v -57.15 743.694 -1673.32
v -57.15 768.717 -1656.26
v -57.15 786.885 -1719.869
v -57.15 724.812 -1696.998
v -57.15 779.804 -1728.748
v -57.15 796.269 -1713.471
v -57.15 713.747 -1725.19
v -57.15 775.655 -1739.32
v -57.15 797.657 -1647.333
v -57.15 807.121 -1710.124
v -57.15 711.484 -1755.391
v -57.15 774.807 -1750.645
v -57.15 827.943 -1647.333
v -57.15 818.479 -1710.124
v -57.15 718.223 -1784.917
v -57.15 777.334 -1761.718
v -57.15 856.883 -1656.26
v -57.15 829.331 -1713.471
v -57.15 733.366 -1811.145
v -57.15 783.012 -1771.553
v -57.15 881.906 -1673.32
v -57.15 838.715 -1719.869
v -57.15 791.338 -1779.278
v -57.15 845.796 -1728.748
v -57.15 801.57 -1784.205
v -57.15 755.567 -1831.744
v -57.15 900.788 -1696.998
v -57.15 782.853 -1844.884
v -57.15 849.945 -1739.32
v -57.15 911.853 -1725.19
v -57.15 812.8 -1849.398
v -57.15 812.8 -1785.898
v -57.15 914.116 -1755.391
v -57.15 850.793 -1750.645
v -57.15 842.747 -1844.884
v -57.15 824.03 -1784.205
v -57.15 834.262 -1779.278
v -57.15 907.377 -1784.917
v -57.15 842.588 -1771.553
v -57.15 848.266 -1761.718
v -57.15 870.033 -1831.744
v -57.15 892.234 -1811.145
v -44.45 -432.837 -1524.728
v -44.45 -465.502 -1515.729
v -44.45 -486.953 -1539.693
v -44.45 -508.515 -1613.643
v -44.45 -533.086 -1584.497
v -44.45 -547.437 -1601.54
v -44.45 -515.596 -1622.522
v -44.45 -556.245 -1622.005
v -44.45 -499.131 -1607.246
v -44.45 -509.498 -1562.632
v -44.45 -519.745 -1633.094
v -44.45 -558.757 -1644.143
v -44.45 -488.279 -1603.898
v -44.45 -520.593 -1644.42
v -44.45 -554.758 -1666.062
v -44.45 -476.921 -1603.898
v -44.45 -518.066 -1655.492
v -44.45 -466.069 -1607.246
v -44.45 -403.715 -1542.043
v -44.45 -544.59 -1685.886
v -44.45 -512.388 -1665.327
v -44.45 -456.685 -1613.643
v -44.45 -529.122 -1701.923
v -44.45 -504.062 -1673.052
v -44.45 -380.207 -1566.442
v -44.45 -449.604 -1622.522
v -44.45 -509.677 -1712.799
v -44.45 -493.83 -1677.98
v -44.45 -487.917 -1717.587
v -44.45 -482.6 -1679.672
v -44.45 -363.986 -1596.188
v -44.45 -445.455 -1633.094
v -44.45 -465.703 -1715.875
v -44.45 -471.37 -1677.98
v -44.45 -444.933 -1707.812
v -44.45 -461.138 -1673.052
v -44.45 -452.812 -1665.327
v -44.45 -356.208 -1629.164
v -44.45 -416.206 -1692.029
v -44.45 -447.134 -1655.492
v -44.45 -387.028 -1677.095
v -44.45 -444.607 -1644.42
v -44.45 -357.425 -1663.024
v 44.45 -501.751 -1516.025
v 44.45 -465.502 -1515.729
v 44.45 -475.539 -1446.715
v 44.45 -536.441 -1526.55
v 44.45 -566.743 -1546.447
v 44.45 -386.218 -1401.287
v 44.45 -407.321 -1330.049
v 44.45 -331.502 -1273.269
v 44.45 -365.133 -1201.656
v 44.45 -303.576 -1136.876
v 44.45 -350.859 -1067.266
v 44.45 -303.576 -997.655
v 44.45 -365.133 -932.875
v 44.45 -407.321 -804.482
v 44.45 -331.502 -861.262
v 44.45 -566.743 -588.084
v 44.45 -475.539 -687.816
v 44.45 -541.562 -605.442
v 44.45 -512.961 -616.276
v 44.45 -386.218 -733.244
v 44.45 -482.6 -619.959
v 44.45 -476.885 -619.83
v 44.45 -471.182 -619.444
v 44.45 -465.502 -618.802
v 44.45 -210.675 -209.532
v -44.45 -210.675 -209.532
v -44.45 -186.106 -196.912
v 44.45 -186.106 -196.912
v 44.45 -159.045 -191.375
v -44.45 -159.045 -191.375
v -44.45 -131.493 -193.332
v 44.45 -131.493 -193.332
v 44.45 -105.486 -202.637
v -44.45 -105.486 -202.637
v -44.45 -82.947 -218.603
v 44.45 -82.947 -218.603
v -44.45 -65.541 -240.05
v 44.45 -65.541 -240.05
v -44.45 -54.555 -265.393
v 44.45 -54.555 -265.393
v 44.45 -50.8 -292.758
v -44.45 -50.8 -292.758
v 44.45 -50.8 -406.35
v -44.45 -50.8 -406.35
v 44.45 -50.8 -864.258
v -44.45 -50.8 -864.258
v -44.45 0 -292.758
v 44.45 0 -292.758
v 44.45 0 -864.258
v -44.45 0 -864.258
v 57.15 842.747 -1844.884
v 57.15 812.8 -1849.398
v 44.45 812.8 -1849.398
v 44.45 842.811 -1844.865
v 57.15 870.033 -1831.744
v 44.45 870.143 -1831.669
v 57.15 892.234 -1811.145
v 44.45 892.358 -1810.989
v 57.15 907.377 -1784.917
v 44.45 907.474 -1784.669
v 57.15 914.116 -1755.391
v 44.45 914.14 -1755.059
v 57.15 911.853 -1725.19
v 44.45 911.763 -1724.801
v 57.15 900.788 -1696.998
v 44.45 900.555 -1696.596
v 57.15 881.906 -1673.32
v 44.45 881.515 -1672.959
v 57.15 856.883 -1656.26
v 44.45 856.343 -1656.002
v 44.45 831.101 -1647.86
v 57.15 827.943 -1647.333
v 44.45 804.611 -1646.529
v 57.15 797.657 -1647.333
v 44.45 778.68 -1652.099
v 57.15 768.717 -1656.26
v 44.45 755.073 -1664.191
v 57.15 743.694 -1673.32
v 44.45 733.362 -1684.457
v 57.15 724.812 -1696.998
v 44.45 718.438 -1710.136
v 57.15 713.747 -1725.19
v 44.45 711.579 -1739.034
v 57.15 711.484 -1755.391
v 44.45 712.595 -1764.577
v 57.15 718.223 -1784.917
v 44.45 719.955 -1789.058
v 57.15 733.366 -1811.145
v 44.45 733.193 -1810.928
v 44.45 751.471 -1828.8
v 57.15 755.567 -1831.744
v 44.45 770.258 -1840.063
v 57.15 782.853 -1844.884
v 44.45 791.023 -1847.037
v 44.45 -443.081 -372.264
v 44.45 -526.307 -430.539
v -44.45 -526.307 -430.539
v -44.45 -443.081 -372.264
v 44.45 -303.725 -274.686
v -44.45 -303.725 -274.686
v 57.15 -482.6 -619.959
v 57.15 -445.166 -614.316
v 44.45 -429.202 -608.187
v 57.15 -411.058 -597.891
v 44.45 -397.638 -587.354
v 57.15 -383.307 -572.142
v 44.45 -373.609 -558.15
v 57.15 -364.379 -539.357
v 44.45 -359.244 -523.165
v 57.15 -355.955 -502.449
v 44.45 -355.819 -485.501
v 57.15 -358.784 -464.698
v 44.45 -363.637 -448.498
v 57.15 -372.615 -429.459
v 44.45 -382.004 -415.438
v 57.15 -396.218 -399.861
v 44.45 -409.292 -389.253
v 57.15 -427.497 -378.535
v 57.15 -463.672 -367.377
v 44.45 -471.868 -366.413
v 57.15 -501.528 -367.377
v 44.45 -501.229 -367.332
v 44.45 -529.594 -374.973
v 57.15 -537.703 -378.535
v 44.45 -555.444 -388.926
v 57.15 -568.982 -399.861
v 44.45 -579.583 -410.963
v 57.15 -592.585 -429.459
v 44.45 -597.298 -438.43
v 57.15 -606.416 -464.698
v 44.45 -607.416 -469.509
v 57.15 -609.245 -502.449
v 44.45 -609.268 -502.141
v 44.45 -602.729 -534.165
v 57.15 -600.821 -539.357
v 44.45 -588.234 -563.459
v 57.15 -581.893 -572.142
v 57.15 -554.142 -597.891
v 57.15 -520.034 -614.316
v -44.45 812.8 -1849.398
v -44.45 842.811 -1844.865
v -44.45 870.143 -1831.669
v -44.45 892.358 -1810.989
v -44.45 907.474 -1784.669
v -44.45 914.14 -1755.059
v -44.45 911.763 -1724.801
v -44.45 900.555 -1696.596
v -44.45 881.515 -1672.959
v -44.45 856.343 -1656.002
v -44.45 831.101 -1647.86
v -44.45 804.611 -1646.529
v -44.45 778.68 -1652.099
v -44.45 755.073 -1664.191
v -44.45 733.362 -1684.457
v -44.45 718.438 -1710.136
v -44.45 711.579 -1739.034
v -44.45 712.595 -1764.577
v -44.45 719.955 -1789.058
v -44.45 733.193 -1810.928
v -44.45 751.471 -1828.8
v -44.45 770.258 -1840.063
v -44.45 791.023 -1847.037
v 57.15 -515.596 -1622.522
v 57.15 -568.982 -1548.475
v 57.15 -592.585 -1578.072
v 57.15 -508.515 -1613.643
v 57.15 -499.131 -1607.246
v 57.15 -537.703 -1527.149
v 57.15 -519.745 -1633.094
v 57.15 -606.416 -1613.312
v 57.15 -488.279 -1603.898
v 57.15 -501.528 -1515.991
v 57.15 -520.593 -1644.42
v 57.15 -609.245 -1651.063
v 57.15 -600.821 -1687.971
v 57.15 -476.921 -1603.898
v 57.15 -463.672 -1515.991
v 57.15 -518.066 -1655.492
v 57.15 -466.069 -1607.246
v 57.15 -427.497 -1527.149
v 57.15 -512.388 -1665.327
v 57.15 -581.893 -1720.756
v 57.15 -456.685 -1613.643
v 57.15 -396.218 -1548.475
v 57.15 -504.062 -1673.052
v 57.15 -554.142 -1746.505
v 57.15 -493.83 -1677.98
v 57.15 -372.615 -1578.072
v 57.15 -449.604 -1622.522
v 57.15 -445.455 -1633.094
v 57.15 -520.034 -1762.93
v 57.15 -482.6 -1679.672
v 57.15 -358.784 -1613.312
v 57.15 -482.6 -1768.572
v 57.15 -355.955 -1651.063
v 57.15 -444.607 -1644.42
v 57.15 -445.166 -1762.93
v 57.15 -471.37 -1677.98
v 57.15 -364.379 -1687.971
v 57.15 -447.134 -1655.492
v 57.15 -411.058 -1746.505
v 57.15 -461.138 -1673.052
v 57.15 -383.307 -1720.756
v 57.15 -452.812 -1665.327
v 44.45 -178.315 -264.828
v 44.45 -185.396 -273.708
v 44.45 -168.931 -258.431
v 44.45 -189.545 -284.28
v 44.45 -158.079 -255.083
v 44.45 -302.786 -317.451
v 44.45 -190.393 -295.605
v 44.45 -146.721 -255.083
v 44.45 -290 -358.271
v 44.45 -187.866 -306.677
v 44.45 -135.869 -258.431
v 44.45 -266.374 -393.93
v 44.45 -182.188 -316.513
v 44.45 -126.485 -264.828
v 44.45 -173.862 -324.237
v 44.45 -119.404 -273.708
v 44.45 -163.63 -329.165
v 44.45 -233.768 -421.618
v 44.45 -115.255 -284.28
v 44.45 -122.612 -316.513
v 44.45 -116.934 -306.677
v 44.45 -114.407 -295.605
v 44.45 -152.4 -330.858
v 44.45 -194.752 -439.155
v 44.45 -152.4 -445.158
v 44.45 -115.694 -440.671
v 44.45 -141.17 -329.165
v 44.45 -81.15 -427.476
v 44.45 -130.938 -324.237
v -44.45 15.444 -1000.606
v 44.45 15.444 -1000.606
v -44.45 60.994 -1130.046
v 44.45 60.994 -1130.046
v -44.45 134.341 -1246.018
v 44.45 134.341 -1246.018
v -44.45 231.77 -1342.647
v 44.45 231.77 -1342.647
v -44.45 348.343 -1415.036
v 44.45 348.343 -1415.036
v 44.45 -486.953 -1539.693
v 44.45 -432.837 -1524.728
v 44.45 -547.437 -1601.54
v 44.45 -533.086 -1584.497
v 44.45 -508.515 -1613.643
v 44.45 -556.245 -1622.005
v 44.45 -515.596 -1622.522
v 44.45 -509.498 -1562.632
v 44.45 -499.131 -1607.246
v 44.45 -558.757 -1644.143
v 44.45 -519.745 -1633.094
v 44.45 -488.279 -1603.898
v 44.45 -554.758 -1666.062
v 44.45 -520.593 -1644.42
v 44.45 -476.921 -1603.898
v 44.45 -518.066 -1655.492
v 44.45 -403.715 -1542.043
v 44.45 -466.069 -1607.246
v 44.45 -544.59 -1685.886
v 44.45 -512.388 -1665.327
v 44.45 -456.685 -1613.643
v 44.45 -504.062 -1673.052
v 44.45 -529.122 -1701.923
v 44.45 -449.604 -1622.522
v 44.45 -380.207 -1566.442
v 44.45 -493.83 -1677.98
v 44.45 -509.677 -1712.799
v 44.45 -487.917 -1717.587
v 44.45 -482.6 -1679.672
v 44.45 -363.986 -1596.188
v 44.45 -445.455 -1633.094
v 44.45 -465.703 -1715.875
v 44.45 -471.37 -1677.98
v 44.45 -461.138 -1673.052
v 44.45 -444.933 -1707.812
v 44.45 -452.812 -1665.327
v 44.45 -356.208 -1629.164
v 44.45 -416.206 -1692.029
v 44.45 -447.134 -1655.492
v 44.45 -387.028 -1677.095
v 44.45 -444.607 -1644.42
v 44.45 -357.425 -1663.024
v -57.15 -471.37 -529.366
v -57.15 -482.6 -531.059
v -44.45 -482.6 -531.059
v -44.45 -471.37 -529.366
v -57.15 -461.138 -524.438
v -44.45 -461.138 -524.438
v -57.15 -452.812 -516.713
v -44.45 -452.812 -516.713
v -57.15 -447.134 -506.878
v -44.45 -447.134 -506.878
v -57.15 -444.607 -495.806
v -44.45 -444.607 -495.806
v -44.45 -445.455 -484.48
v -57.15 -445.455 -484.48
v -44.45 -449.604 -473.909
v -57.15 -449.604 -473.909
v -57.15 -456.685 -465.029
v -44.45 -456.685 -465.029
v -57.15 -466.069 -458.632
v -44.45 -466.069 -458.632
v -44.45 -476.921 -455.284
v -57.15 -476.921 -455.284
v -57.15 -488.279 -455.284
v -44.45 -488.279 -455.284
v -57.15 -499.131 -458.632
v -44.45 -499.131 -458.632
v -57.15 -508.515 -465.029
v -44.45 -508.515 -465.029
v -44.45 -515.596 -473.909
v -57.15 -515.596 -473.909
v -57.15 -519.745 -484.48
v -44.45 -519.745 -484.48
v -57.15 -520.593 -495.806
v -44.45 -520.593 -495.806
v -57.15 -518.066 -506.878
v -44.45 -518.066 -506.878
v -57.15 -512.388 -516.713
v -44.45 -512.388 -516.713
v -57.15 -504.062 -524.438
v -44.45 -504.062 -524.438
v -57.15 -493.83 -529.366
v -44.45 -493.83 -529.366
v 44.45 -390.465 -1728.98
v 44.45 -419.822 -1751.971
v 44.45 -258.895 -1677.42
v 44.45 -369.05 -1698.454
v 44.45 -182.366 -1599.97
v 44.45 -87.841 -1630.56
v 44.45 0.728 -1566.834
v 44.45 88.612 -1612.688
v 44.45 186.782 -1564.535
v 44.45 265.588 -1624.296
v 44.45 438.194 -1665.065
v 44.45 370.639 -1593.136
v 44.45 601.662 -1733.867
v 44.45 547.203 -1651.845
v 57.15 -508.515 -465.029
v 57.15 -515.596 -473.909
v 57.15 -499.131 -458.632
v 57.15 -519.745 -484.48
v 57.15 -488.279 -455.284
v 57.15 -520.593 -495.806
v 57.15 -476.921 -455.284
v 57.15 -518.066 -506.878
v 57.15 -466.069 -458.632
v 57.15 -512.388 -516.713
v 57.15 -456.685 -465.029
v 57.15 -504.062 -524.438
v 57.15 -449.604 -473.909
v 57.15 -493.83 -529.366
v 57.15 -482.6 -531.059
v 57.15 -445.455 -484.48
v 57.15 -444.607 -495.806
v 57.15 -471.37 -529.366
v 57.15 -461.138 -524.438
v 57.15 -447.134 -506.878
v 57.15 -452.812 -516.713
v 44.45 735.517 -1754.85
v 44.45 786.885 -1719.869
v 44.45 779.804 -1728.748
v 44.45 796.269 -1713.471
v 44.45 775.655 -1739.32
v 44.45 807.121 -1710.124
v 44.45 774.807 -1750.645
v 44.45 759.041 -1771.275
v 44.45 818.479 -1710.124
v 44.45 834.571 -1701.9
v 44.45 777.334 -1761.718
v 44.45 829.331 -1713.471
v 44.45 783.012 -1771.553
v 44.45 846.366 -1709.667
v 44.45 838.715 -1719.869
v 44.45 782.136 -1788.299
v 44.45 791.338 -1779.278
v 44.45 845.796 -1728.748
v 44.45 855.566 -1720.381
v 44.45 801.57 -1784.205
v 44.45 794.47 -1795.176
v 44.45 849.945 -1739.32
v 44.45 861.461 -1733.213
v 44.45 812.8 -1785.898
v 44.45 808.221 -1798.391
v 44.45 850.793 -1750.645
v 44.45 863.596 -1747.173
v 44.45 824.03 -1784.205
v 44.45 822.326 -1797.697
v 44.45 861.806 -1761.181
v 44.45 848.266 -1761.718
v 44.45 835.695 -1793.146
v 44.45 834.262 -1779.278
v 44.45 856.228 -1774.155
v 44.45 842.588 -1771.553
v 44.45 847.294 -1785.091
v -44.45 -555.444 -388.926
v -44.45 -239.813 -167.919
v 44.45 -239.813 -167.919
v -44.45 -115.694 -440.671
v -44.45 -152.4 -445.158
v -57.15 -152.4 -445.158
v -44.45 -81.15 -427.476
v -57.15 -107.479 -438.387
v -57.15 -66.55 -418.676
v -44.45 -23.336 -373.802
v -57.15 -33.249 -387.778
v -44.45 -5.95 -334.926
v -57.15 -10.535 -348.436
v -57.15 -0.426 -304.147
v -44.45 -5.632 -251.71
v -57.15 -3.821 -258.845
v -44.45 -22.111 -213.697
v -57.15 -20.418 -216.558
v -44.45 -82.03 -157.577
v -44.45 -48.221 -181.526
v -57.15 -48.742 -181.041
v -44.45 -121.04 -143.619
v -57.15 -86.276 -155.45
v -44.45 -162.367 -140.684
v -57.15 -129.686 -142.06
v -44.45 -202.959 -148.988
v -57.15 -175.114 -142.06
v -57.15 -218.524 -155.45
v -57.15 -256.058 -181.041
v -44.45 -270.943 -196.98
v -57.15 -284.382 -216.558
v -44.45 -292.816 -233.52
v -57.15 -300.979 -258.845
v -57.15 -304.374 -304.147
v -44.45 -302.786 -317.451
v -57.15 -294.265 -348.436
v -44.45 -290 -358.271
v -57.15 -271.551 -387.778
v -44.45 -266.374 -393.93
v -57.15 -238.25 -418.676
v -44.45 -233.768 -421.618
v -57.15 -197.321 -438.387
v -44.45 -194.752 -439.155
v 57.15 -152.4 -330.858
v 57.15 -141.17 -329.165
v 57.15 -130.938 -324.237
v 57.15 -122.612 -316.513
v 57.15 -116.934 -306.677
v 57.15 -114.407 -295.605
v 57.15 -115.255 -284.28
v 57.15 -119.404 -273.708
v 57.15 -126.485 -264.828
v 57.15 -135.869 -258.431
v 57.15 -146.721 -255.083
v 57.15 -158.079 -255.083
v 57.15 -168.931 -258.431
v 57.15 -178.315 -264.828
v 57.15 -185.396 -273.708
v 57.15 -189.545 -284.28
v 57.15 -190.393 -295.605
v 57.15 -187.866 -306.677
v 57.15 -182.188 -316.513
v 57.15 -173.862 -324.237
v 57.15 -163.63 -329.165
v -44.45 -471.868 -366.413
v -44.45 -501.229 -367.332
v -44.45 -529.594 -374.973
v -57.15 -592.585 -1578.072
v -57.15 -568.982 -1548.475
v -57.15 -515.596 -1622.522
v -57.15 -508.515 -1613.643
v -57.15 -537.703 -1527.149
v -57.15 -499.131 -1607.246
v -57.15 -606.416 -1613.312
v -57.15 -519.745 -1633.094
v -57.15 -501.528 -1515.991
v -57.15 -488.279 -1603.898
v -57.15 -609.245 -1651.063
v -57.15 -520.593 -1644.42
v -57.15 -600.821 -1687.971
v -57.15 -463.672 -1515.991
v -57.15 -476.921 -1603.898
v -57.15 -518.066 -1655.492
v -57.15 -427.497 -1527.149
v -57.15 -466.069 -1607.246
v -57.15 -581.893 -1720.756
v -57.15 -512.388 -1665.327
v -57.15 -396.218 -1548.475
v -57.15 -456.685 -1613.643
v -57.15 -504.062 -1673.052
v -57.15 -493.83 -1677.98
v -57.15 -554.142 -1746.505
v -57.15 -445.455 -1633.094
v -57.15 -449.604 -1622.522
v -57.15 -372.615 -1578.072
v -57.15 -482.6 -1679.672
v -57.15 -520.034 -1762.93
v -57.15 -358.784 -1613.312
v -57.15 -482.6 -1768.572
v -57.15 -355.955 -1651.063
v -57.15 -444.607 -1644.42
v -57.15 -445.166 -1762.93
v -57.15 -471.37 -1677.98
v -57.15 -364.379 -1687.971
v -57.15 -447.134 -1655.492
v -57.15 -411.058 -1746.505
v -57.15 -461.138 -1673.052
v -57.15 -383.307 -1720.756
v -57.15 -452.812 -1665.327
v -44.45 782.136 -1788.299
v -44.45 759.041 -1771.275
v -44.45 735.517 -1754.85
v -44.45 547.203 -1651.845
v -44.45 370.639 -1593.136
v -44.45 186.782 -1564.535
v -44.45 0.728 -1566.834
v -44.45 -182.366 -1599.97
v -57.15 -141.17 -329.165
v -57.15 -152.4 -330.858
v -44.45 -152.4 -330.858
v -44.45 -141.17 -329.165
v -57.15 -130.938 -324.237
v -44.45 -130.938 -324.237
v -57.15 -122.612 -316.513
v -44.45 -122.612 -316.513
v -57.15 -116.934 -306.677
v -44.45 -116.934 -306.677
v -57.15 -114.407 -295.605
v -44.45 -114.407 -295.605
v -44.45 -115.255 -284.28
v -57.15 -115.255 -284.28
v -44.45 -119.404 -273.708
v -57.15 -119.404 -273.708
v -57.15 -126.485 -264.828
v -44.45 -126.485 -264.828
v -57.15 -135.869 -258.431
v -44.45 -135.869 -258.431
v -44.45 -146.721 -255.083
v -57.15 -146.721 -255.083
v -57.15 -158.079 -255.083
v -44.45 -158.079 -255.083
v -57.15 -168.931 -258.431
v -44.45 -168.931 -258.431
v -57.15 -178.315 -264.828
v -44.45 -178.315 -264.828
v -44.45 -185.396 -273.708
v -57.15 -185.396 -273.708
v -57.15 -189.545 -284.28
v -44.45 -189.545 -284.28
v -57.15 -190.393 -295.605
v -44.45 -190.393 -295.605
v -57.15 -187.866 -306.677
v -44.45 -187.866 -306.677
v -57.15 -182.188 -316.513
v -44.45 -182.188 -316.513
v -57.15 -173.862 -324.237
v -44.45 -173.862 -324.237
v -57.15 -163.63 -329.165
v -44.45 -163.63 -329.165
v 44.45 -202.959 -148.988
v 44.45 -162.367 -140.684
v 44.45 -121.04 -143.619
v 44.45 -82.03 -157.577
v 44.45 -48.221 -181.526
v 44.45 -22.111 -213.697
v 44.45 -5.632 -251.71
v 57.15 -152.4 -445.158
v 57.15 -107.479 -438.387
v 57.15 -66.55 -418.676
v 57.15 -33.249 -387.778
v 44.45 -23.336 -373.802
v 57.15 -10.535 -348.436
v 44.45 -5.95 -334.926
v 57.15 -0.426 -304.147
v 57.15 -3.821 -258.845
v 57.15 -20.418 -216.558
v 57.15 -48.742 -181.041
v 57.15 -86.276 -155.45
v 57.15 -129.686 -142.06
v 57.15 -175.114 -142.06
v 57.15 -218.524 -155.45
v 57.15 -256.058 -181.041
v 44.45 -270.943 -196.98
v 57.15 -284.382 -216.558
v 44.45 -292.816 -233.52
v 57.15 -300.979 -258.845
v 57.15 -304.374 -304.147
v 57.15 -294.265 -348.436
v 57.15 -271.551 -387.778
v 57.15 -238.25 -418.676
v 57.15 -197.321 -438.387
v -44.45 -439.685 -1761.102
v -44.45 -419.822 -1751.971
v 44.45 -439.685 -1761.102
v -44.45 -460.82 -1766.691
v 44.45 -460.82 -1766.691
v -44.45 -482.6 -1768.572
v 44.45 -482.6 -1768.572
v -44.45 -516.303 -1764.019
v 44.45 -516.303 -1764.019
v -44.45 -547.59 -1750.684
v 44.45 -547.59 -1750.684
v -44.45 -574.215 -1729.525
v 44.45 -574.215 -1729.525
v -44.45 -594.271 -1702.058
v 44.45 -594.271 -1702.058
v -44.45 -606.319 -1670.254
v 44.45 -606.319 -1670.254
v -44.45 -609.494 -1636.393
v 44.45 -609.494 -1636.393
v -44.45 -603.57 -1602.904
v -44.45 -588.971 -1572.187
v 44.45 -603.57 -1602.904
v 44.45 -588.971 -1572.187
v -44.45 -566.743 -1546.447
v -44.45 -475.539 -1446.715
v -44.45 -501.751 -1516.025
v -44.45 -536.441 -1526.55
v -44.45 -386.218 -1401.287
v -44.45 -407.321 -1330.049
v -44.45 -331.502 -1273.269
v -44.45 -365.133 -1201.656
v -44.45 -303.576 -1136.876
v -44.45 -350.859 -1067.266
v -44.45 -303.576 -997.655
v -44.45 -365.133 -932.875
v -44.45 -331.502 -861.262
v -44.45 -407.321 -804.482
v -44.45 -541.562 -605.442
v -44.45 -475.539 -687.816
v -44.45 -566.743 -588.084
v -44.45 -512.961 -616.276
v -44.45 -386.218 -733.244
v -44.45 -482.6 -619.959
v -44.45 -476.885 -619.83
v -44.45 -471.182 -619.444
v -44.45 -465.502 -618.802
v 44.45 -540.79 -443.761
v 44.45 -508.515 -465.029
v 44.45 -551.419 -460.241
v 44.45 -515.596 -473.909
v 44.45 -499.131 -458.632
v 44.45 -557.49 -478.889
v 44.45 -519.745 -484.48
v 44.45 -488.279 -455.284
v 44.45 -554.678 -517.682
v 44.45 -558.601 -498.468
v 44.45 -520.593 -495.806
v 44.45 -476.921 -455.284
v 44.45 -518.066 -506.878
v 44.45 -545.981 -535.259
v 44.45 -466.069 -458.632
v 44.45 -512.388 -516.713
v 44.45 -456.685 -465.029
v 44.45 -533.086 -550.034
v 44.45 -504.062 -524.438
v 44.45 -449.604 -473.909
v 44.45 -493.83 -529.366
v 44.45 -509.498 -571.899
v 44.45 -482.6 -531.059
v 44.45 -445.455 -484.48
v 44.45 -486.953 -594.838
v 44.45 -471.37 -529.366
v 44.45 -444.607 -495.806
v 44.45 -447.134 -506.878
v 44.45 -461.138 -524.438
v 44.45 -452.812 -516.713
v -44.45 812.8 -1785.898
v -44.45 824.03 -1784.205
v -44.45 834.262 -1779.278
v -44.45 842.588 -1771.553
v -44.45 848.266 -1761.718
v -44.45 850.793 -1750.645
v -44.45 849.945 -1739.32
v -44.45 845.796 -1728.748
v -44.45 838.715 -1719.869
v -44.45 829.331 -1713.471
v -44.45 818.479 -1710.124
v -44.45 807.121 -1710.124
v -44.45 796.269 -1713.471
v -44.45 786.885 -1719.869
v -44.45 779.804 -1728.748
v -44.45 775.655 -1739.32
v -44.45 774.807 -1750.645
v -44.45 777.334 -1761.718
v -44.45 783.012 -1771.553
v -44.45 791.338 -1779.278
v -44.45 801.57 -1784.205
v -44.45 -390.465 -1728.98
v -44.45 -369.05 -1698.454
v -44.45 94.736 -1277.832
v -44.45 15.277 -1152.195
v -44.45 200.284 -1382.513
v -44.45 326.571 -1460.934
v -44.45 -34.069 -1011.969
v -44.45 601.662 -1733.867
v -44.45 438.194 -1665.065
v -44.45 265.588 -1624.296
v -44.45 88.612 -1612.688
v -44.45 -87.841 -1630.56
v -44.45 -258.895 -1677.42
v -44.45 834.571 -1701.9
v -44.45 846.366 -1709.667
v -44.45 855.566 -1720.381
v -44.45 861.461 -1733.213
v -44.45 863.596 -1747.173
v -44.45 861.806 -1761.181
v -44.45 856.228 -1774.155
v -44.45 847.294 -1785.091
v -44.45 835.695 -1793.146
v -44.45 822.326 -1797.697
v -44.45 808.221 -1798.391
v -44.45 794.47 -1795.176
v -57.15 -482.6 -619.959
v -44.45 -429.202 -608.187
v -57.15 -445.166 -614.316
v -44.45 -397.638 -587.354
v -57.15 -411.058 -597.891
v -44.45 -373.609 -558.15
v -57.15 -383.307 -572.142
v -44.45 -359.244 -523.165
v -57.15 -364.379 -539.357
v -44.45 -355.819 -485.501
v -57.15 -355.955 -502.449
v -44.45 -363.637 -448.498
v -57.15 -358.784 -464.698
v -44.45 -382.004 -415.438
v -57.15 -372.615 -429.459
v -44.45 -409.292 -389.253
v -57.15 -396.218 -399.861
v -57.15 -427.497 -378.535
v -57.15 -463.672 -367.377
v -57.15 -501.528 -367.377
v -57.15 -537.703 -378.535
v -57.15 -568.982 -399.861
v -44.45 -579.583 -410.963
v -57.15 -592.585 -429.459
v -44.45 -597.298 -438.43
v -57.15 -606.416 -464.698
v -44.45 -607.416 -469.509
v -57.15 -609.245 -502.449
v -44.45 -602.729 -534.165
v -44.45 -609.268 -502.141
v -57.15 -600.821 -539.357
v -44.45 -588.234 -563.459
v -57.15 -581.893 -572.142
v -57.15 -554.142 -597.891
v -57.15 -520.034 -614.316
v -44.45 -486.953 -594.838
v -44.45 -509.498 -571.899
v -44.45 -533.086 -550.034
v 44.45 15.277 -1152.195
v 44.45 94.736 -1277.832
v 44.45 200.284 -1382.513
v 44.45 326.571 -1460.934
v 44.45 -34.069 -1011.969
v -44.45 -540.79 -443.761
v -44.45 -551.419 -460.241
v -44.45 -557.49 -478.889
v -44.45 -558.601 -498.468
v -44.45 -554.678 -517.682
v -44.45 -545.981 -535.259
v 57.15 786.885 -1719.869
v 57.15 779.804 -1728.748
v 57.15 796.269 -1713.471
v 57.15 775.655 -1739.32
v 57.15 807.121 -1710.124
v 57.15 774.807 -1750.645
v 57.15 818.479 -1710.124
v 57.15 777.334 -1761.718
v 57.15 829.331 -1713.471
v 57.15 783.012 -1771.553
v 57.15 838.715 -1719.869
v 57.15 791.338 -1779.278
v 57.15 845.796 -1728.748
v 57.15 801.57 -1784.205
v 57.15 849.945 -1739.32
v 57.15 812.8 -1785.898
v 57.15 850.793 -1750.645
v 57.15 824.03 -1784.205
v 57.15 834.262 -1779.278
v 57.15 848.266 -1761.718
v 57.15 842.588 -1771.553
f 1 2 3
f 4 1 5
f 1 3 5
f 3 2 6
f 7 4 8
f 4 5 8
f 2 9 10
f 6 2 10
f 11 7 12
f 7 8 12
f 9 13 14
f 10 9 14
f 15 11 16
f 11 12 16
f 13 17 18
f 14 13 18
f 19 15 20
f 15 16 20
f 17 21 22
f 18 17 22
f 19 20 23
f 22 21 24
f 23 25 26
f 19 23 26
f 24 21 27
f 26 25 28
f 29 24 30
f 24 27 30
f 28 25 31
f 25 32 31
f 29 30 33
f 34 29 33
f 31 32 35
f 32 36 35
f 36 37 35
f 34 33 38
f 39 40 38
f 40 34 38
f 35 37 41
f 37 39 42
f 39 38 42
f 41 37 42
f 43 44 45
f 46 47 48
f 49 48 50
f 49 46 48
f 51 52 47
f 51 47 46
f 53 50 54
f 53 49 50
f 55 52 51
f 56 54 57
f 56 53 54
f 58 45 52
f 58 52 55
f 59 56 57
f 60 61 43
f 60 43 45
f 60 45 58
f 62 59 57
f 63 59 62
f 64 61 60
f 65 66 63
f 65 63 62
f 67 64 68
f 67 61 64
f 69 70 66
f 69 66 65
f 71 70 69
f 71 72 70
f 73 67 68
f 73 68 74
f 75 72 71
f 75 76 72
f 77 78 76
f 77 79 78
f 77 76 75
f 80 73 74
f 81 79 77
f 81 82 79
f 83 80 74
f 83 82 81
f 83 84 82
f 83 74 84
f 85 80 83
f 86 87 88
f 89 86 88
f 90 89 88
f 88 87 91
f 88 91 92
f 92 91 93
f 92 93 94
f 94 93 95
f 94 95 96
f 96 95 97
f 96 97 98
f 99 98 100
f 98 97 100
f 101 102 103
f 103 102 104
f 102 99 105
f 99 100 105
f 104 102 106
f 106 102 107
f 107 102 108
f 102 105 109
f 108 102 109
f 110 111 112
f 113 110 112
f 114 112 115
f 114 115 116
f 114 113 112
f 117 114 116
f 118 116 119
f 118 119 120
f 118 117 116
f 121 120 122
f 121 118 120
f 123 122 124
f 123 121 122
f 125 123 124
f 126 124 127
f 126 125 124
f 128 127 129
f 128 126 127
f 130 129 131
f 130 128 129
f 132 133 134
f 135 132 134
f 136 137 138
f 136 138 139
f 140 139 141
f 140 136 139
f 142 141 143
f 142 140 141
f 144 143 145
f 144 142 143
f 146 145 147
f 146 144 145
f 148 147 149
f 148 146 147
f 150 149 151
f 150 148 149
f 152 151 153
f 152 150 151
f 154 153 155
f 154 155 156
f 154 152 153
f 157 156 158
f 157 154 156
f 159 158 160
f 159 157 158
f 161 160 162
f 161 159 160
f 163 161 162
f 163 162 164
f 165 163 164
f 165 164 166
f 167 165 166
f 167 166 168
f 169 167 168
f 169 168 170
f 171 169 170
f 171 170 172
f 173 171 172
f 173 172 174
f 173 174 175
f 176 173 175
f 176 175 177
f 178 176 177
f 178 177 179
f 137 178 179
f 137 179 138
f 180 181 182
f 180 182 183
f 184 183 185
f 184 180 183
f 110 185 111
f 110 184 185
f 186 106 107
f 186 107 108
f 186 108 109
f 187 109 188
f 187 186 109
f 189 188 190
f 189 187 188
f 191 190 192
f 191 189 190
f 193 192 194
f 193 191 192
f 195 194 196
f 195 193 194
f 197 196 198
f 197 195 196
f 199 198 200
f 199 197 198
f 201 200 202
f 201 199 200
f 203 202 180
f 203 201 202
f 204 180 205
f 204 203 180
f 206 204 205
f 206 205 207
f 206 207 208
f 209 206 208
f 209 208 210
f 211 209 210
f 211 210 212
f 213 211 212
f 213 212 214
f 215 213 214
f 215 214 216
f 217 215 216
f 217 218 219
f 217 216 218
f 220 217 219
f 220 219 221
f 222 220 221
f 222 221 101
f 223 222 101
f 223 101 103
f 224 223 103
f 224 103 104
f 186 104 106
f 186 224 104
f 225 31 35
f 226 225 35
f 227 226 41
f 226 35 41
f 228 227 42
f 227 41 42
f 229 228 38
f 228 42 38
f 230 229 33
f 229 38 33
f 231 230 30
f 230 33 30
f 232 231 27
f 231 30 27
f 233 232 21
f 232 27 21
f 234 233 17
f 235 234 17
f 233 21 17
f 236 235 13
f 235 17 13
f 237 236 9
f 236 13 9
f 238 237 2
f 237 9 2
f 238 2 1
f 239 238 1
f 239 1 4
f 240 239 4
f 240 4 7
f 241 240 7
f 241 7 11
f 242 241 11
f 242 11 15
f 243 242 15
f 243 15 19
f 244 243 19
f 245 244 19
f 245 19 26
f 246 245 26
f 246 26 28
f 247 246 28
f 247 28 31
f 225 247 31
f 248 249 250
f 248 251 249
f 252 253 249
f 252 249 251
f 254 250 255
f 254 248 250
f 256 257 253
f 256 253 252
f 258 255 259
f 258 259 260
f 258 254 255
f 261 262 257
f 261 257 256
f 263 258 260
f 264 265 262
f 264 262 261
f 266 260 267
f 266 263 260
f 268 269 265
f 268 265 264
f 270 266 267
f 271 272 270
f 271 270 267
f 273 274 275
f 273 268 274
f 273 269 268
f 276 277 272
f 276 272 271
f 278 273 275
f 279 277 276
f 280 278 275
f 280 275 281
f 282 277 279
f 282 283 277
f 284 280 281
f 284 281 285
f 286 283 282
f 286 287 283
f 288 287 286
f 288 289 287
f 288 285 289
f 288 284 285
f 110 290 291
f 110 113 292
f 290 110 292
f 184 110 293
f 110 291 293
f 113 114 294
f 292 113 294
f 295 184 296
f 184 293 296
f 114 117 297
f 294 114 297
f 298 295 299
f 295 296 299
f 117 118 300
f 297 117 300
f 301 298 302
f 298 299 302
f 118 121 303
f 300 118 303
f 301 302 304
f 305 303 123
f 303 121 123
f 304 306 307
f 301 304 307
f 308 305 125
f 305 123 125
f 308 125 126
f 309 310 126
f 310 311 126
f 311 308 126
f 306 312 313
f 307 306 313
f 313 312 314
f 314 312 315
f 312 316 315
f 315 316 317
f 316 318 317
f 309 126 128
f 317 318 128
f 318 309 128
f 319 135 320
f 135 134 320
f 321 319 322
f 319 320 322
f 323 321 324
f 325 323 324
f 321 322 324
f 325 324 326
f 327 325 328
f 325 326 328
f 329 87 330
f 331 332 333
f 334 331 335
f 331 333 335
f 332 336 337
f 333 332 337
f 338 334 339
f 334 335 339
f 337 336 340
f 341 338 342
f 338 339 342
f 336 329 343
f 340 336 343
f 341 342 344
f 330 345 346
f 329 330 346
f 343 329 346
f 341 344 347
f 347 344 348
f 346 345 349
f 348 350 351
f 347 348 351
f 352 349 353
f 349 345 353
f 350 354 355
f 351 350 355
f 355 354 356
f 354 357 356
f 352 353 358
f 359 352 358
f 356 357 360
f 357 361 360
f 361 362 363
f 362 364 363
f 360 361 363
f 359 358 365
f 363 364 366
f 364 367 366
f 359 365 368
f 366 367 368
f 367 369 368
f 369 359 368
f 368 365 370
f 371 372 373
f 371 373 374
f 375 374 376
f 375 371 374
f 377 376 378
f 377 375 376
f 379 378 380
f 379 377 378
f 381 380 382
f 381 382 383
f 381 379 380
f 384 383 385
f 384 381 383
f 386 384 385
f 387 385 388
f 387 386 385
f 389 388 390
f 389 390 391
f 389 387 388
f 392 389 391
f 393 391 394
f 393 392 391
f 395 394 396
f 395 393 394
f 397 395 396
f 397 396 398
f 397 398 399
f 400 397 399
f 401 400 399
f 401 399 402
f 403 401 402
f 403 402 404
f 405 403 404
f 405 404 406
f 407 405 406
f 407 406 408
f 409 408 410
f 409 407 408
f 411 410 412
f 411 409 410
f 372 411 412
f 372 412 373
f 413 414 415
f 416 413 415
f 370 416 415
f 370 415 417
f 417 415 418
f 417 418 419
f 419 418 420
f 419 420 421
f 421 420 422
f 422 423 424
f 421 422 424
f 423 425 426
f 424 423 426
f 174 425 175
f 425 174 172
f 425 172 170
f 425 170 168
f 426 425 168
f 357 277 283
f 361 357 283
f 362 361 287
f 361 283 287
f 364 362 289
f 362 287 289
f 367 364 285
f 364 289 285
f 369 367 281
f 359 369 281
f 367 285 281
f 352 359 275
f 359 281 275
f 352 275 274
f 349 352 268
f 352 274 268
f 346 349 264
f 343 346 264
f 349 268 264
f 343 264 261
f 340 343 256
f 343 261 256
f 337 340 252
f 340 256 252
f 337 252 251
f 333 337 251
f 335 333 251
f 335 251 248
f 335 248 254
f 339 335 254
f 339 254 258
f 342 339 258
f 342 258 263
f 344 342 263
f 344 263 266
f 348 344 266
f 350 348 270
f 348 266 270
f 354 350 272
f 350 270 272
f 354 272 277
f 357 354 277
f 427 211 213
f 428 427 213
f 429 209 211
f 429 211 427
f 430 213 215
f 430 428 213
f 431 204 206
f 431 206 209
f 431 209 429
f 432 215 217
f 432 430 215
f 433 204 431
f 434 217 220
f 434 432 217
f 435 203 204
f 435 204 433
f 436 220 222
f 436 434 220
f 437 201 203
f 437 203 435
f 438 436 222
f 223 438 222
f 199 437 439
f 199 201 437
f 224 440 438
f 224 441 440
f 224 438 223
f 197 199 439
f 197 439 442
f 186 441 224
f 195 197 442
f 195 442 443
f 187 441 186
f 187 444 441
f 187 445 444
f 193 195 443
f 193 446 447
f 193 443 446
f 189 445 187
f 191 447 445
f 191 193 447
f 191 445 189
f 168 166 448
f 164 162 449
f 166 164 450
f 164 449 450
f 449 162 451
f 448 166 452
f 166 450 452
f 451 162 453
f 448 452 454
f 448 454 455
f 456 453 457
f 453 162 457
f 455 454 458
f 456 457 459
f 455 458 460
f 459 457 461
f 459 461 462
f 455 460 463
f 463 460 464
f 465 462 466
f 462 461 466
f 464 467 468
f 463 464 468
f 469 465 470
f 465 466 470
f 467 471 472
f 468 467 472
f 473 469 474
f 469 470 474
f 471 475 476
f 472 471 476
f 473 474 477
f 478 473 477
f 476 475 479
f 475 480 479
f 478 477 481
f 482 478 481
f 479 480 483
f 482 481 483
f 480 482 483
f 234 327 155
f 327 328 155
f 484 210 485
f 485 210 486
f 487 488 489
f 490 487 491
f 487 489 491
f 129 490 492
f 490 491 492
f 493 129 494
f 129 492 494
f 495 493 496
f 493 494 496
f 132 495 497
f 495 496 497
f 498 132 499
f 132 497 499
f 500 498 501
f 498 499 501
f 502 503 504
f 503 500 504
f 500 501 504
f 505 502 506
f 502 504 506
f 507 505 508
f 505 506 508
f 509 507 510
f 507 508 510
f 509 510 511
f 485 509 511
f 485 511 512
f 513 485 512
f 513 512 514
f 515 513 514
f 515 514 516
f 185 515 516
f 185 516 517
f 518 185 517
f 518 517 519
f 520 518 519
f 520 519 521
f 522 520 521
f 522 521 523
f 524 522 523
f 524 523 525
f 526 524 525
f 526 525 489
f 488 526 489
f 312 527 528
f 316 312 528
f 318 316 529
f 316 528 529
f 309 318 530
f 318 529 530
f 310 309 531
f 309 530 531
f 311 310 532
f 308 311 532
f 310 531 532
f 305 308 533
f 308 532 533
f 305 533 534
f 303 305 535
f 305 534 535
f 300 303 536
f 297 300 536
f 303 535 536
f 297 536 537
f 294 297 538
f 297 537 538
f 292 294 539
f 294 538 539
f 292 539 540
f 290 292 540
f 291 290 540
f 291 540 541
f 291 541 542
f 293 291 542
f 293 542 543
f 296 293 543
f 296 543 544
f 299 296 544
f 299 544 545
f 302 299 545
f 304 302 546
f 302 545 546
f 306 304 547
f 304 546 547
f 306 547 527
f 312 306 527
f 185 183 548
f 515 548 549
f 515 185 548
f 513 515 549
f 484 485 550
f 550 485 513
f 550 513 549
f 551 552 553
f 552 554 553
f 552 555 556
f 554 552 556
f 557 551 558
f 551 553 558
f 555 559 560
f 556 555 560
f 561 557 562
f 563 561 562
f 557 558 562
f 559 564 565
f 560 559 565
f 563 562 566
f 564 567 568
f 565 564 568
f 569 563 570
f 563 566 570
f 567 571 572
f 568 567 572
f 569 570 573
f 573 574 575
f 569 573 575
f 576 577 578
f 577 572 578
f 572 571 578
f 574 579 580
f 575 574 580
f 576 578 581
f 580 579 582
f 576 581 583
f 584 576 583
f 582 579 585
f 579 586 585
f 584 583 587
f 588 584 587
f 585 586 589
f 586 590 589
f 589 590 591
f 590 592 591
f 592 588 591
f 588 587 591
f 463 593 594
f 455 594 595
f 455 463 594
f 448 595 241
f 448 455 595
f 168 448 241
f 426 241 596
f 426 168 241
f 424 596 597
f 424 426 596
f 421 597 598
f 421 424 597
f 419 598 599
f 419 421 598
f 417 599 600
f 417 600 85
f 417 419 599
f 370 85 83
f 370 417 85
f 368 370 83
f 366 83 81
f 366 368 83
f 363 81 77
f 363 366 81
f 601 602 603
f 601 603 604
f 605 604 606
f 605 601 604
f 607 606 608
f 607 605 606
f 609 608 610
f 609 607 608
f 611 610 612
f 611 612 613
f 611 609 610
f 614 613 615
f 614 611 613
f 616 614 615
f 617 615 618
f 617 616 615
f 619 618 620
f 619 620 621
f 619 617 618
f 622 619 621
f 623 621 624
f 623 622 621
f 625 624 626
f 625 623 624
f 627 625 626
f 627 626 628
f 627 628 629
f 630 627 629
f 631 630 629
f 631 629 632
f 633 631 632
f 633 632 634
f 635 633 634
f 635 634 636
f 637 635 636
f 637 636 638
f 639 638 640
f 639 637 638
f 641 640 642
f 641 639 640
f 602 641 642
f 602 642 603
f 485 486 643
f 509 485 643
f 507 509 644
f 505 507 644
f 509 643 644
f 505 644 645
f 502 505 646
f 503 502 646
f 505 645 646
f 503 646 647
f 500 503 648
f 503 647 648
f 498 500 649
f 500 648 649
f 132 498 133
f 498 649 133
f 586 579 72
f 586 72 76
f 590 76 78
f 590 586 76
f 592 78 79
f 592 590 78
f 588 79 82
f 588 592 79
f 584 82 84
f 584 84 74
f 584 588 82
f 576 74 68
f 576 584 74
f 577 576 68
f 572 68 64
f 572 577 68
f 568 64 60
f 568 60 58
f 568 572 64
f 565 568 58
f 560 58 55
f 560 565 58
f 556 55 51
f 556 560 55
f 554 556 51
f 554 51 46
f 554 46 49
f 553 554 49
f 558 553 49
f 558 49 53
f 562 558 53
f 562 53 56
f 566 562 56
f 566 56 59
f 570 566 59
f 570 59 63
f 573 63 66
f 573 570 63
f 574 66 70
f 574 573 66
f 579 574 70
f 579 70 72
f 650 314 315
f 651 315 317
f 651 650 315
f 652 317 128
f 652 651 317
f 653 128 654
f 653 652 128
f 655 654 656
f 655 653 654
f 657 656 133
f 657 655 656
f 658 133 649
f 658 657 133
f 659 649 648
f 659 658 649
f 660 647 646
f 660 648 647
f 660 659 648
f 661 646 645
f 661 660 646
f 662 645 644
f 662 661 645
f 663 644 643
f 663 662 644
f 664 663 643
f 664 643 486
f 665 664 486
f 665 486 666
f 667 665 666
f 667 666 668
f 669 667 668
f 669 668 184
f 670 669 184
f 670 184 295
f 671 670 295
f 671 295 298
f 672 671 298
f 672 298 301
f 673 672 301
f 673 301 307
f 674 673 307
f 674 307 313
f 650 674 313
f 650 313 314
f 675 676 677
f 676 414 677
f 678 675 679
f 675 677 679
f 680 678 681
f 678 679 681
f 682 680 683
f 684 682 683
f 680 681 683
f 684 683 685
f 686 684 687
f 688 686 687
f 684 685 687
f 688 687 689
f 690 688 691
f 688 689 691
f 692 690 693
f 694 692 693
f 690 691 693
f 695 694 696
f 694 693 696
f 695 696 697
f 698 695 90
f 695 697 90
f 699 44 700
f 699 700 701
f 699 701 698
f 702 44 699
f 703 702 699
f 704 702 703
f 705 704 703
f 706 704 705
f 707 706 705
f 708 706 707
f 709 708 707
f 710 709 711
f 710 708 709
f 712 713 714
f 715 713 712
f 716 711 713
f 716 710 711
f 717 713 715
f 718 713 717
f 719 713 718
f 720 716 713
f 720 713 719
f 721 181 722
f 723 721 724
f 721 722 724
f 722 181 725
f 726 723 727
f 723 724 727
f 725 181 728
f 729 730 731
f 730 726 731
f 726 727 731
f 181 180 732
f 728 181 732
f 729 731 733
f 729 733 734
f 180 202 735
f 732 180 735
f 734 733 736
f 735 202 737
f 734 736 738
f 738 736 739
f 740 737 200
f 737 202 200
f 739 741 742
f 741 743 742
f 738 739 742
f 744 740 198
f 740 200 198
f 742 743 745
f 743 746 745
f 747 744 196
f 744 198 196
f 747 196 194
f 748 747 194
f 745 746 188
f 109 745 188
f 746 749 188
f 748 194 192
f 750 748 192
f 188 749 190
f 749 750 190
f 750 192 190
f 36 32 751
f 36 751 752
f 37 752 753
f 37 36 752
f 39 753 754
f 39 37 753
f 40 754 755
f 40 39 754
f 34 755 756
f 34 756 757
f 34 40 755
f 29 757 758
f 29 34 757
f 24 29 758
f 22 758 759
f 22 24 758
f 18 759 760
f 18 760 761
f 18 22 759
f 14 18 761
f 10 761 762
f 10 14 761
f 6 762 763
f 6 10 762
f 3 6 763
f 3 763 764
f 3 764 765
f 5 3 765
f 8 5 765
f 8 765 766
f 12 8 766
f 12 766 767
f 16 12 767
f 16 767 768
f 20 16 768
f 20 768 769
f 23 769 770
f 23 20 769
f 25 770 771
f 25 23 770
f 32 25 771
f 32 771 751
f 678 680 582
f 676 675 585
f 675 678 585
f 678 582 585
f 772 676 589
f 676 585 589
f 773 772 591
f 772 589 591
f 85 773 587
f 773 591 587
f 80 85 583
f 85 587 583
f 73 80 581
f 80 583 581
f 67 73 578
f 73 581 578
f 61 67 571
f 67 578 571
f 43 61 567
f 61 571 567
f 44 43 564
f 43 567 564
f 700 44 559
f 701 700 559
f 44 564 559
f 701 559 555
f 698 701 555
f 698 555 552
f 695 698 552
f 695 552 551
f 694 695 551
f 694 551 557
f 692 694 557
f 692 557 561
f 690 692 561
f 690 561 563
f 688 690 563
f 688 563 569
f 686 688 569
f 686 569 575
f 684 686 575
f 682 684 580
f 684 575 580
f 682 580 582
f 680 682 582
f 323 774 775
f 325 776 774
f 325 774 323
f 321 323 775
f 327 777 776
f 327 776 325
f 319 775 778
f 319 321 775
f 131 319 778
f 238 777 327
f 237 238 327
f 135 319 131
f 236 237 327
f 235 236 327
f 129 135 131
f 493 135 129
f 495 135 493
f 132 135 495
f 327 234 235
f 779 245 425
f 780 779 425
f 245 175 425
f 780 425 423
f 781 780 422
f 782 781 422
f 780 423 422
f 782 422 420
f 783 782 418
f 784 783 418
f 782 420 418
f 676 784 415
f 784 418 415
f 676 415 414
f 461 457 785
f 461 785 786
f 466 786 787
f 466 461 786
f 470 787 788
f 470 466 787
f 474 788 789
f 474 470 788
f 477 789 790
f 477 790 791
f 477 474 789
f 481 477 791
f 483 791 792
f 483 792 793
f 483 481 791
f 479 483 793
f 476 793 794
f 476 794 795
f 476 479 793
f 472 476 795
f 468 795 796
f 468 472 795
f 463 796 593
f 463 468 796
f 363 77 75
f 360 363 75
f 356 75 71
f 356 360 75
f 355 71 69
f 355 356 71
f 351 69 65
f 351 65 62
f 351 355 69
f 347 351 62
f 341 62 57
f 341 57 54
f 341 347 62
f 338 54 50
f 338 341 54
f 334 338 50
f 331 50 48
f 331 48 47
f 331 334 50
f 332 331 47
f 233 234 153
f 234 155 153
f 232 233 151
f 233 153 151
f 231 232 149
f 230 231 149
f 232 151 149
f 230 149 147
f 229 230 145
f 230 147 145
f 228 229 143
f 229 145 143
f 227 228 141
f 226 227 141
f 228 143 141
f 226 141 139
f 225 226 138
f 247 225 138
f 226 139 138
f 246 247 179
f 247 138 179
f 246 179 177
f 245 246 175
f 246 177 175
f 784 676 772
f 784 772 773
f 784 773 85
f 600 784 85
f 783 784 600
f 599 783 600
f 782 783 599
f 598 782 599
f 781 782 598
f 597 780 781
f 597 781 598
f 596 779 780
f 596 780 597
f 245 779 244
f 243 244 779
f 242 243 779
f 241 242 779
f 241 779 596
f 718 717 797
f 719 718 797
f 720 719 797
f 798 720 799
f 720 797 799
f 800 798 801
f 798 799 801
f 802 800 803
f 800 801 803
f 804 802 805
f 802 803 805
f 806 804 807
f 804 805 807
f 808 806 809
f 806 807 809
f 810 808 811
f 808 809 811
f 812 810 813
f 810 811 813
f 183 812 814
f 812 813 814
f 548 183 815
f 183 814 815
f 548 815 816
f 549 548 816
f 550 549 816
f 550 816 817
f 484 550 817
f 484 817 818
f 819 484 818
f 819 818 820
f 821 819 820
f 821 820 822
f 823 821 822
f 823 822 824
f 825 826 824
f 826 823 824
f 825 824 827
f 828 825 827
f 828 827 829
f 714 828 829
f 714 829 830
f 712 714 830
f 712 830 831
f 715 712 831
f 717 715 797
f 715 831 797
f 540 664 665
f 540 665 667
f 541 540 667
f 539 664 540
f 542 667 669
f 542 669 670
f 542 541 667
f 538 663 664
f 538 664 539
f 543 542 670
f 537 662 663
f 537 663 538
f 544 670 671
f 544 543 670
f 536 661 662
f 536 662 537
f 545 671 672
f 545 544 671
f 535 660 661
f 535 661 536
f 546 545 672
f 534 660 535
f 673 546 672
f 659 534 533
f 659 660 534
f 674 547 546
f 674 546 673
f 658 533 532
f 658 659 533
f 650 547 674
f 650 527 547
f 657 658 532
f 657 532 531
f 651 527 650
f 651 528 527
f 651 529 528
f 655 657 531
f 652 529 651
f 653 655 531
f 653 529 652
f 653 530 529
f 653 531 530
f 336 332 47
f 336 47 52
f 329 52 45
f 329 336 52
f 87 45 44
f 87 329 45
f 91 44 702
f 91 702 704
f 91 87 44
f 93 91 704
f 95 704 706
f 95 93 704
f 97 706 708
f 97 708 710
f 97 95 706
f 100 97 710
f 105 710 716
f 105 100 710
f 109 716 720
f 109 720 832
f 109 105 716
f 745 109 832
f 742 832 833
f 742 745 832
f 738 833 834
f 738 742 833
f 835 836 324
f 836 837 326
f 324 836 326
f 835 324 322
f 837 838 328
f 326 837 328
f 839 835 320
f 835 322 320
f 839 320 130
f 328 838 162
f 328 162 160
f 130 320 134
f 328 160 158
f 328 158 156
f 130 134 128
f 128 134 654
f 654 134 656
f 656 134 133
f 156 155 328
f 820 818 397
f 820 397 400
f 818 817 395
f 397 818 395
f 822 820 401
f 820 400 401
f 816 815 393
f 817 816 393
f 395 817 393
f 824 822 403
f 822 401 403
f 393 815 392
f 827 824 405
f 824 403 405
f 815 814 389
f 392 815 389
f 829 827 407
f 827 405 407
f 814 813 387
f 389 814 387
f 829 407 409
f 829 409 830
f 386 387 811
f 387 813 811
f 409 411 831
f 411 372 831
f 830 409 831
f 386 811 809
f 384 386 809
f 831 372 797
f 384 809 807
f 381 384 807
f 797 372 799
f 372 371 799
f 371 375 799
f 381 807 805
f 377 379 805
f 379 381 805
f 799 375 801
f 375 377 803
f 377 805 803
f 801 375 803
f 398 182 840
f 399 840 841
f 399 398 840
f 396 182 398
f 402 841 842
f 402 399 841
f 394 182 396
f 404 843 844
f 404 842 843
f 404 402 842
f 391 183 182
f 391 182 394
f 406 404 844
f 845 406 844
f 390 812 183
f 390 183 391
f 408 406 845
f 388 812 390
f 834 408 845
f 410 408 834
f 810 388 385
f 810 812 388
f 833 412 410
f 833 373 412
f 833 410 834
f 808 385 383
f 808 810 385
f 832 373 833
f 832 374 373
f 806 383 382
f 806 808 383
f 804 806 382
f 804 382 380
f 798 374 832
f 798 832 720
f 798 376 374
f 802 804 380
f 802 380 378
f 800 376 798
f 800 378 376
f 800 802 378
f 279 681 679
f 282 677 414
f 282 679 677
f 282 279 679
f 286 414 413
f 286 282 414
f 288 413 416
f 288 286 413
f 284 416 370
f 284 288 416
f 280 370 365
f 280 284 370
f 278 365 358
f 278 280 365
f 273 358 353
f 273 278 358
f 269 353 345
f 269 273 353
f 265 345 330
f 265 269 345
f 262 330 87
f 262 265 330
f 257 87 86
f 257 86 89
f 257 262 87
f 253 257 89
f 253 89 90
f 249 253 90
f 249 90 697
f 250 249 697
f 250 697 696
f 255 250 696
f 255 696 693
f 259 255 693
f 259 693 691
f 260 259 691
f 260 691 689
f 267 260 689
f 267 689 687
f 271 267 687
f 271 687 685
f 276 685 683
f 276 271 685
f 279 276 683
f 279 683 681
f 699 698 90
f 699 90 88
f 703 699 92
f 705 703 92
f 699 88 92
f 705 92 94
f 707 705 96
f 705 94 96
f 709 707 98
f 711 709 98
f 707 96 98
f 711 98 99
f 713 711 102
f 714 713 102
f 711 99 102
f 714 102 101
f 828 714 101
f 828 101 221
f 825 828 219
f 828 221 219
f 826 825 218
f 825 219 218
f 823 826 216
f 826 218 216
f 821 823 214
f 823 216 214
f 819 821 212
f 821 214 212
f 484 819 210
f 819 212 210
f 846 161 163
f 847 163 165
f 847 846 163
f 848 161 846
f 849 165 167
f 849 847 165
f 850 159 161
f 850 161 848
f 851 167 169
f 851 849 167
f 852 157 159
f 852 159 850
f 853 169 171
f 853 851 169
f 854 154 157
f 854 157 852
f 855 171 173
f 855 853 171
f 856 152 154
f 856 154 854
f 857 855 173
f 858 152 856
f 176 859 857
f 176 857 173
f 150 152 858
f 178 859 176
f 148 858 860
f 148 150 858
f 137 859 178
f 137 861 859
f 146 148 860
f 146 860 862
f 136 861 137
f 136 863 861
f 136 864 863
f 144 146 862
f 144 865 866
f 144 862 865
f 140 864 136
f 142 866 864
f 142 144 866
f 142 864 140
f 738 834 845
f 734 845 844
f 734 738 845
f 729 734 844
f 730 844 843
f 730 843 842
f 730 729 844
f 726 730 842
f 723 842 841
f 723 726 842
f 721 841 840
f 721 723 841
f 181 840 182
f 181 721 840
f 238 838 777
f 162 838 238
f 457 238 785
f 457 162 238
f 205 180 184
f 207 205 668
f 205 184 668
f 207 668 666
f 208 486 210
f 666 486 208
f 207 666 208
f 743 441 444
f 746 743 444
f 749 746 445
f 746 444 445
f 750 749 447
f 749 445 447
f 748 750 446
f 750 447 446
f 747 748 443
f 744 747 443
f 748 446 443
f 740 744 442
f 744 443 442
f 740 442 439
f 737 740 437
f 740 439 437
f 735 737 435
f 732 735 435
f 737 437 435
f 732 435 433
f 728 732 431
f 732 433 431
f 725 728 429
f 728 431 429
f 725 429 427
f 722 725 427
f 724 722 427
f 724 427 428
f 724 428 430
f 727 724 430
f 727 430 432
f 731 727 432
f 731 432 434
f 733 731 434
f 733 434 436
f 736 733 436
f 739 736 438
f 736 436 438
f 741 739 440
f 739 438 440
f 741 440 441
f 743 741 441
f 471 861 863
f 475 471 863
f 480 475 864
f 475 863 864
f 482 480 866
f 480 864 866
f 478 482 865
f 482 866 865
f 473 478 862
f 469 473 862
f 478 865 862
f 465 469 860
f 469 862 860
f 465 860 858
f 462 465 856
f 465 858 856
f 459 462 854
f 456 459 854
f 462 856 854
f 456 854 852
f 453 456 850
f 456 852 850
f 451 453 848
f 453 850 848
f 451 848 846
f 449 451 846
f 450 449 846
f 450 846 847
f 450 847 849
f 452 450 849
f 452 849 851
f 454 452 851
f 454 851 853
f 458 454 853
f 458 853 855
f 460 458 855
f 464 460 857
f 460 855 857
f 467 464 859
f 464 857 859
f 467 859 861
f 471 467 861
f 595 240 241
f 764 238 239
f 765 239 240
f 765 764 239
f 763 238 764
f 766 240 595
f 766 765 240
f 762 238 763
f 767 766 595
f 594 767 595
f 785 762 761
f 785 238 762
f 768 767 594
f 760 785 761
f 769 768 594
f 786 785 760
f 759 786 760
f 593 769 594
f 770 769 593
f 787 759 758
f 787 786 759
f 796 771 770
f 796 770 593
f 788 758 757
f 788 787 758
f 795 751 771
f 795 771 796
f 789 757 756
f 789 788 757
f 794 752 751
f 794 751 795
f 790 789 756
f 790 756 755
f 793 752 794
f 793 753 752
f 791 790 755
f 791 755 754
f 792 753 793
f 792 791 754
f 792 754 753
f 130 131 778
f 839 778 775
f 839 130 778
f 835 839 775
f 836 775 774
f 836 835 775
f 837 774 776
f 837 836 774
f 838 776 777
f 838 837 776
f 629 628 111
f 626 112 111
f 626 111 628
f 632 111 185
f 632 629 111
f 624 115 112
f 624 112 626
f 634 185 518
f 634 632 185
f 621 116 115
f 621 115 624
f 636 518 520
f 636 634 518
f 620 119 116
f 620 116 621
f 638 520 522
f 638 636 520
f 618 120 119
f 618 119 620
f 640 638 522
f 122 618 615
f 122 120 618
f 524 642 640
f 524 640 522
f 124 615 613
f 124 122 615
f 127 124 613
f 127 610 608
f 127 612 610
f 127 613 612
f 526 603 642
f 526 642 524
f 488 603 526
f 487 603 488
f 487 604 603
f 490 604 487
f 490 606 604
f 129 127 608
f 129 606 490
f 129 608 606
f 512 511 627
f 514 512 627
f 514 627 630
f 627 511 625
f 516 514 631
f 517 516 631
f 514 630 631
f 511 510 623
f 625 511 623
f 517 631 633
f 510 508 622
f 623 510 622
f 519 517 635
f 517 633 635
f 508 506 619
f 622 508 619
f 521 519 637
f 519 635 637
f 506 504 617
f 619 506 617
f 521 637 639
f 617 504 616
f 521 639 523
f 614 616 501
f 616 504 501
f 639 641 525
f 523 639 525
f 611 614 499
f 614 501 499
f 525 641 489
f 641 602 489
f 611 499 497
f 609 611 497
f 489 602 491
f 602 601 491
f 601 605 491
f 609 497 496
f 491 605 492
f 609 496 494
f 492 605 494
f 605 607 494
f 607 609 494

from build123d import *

# Parameters (mm, degrees)
BOSS_EXTRUDE1_DEPTH = 44.449999999999996
BOSS_EXTRUDE2_START = 12.7
SKETCH2_R           = 127.00000000000026
SKETCH2_R_2         = 38.09999999999998
SKETCH2_R_3         = 152.39999999999995
SKETCH2_R_4         = 38.10000000000004
SKETCH2_R_5         = 127.00000000000524
SKETCH2_R_6         = 38.10000000000009
SKETCH2_R_7         = 101.59999999999945
SKETCH2_R_8         = 38.10000000000007
BOSS_EXTRUDE2_DEPTH = 12.7


with BuildPart() as part:
    # Sketch1 → Boss-Extrude1 (new, symmetric)
    with BuildSketch(Plane(origin=(0, 0, 0), x_dir=(0, 0, -1), z_dir=(1, 0, 0))):
        with BuildLine():
            Line((292.75767615040746, -1.5786e-13), (864.2576761504075, -4.1113e-13))
            ThreePointArc((864.2576761504075, -4.1113e-13), (1190.1025822900356, 94.39396631749571), (1415.036093761449, 348.34285714285653))
            Line((1415.036093761449, 348.34285714285653), (1656.0016514662793, 856.3428571428565))
            ThreePointArc((1656.0016514662793, 856.3428571428565), (1800.5110136275975, 899.6556499579777), (1828.8000000000002, 751.4710116727003))
            ThreePointArc((1828.8000000000002, 751.4710116727003), (1614.8079841790877, 177.34138113633213), (1751.9712010597207, -419.8216346557389))
            ThreePointArc((1751.9712010597207, -419.8216346557389), (1715.4290562941019, -585.9160522435095), (1546.4465674603723, -566.7430930182793))
            ThreePointArc((1546.4465674603723, -566.7430930182793), (1067.265507093057, -350.8585161091587), (588.0844467257416, -566.7430930182793))
            ThreePointArc((588.0844467257416, -566.7430930182793), (485.76498042432655, -609.3961073308187), (388.92622108801334, -555.4442074165836))
            Line((388.92622108801334, -555.4442074165836), (167.91890460076553, -239.8130488999002))
            ThreePointArc((167.91890460076553, -239.8130488999002), (157.5772251740463, -82.02951134298137), (292.75767615040746, -1.5786e-13))
        make_face()
        with BuildLine():
            Line((292.7576761504074, -50.8), (864.2576761504075, -50.8))
            ThreePointArc((864.2576761504075, -50.8), (1217.2563244683374, 51.46013017728751), (1460.9342952290358, 326.571428571428))
            Line((1460.9342952290358, 326.571428571428), (1701.8998529338662, 834.571428571428))
            ThreePointArc((1701.8998529338662, 834.571428571428), (1774.1545340145256, 856.2278249789883), (1788.2990272007264, 782.1355058363492))
            ThreePointArc((1788.2990272007264, 782.1355058363492), (1564.1169153883338, 180.66636908396612), (1707.8117140251866, -444.93298079344424))
            ThreePointArc((1707.8117140251866, -444.93298079344424), (1685.8864271658267, -544.589631346108), (1584.4969338655828, -533.0858558109679))
            ThreePointArc((1584.4969338655828, -533.0858558109679), (1067.265507093057, -300.058516109159), (550.0340803205312, -533.0858558109682))
            ThreePointArc((550.0340803205312, -533.0858558109682), (488.6424005396823, -558.6776643984912), (430.53914493789466, -526.306524449951))
            Line((430.53914493789466, -526.306524449951), (209.53182845064617, -210.6753659332667))
            ThreePointArc((209.53182845064617, -210.6753659332667), (202.6373754995001, -105.48634089532098), (292.7576761504074, -50.8))
        make_face(mode=Mode.SUBTRACT)
    extrude(amount=BOSS_EXTRUDE1_DEPTH, both=True)

    # Sketch2 → Boss-Extrude2 (add)
    # profile 1 of 4: a face of its own
    with BuildSketch(Plane(origin=(44.449999999999996, 0, 0), x_dir=(0, 0, -1), z_dir=(1, 0, 0)).offset(BOSS_EXTRUDE2_START)):
        with Locations((492.95853071271534, -482.60000000000036)):
            Circle(SKETCH2_R)
        with Locations((492.95853071271534, -482.60000000000036)):
            Circle(SKETCH2_R_2, mode=Mode.SUBTRACT)
    # profile 2 of 4: a face of its own
    with BuildSketch(Plane(origin=(44.449999999999996, 0, 0), x_dir=(0, 0, -1), z_dir=(1, 0, 0)).offset(BOSS_EXTRUDE2_START)):
        with Locations((292.7576761504074, -152.40000000000018)):
            Circle(SKETCH2_R_3)
        with Locations((292.7576761504074, -152.40000000000018)):
            Circle(SKETCH2_R_4, mode=Mode.SUBTRACT)
    # profile 3 of 4: a face of its own
    with BuildSketch(Plane(origin=(44.449999999999996, 0, 0), x_dir=(0, 0, -1), z_dir=(1, 0, 0)).offset(BOSS_EXTRUDE2_START)):
        with Locations((1641.5724834734083, -482.6000000000008)):
            Circle(SKETCH2_R_5)
        with Locations((1641.5724834734083, -482.6000000000008)):
            Circle(SKETCH2_R_6, mode=Mode.SUBTRACT)
    # profile 4 of 4: a face of its own
    with BuildSketch(Plane(origin=(44.449999999999996, 0, 0), x_dir=(0, 0, -1), z_dir=(1, 0, 0)).offset(BOSS_EXTRUDE2_START)):
        with Locations((1747.798054401453, 812.7999999999992)):
            Circle(SKETCH2_R_7)
        with Locations((1747.798054401453, 812.7999999999992)):
            Circle(SKETCH2_R_8, mode=Mode.SUBTRACT)
    boss_extrude2 = extrude(amount=-BOSS_EXTRUDE2_DEPTH)

    # Mirror1: Boss-Extrude2 across plane
    add(boss_extrude2.mirror(Plane(origin=(0, 0, 0), x_dir=(0, 0, 1), z_dir=(1, 0, 0))))


solid = part.part
